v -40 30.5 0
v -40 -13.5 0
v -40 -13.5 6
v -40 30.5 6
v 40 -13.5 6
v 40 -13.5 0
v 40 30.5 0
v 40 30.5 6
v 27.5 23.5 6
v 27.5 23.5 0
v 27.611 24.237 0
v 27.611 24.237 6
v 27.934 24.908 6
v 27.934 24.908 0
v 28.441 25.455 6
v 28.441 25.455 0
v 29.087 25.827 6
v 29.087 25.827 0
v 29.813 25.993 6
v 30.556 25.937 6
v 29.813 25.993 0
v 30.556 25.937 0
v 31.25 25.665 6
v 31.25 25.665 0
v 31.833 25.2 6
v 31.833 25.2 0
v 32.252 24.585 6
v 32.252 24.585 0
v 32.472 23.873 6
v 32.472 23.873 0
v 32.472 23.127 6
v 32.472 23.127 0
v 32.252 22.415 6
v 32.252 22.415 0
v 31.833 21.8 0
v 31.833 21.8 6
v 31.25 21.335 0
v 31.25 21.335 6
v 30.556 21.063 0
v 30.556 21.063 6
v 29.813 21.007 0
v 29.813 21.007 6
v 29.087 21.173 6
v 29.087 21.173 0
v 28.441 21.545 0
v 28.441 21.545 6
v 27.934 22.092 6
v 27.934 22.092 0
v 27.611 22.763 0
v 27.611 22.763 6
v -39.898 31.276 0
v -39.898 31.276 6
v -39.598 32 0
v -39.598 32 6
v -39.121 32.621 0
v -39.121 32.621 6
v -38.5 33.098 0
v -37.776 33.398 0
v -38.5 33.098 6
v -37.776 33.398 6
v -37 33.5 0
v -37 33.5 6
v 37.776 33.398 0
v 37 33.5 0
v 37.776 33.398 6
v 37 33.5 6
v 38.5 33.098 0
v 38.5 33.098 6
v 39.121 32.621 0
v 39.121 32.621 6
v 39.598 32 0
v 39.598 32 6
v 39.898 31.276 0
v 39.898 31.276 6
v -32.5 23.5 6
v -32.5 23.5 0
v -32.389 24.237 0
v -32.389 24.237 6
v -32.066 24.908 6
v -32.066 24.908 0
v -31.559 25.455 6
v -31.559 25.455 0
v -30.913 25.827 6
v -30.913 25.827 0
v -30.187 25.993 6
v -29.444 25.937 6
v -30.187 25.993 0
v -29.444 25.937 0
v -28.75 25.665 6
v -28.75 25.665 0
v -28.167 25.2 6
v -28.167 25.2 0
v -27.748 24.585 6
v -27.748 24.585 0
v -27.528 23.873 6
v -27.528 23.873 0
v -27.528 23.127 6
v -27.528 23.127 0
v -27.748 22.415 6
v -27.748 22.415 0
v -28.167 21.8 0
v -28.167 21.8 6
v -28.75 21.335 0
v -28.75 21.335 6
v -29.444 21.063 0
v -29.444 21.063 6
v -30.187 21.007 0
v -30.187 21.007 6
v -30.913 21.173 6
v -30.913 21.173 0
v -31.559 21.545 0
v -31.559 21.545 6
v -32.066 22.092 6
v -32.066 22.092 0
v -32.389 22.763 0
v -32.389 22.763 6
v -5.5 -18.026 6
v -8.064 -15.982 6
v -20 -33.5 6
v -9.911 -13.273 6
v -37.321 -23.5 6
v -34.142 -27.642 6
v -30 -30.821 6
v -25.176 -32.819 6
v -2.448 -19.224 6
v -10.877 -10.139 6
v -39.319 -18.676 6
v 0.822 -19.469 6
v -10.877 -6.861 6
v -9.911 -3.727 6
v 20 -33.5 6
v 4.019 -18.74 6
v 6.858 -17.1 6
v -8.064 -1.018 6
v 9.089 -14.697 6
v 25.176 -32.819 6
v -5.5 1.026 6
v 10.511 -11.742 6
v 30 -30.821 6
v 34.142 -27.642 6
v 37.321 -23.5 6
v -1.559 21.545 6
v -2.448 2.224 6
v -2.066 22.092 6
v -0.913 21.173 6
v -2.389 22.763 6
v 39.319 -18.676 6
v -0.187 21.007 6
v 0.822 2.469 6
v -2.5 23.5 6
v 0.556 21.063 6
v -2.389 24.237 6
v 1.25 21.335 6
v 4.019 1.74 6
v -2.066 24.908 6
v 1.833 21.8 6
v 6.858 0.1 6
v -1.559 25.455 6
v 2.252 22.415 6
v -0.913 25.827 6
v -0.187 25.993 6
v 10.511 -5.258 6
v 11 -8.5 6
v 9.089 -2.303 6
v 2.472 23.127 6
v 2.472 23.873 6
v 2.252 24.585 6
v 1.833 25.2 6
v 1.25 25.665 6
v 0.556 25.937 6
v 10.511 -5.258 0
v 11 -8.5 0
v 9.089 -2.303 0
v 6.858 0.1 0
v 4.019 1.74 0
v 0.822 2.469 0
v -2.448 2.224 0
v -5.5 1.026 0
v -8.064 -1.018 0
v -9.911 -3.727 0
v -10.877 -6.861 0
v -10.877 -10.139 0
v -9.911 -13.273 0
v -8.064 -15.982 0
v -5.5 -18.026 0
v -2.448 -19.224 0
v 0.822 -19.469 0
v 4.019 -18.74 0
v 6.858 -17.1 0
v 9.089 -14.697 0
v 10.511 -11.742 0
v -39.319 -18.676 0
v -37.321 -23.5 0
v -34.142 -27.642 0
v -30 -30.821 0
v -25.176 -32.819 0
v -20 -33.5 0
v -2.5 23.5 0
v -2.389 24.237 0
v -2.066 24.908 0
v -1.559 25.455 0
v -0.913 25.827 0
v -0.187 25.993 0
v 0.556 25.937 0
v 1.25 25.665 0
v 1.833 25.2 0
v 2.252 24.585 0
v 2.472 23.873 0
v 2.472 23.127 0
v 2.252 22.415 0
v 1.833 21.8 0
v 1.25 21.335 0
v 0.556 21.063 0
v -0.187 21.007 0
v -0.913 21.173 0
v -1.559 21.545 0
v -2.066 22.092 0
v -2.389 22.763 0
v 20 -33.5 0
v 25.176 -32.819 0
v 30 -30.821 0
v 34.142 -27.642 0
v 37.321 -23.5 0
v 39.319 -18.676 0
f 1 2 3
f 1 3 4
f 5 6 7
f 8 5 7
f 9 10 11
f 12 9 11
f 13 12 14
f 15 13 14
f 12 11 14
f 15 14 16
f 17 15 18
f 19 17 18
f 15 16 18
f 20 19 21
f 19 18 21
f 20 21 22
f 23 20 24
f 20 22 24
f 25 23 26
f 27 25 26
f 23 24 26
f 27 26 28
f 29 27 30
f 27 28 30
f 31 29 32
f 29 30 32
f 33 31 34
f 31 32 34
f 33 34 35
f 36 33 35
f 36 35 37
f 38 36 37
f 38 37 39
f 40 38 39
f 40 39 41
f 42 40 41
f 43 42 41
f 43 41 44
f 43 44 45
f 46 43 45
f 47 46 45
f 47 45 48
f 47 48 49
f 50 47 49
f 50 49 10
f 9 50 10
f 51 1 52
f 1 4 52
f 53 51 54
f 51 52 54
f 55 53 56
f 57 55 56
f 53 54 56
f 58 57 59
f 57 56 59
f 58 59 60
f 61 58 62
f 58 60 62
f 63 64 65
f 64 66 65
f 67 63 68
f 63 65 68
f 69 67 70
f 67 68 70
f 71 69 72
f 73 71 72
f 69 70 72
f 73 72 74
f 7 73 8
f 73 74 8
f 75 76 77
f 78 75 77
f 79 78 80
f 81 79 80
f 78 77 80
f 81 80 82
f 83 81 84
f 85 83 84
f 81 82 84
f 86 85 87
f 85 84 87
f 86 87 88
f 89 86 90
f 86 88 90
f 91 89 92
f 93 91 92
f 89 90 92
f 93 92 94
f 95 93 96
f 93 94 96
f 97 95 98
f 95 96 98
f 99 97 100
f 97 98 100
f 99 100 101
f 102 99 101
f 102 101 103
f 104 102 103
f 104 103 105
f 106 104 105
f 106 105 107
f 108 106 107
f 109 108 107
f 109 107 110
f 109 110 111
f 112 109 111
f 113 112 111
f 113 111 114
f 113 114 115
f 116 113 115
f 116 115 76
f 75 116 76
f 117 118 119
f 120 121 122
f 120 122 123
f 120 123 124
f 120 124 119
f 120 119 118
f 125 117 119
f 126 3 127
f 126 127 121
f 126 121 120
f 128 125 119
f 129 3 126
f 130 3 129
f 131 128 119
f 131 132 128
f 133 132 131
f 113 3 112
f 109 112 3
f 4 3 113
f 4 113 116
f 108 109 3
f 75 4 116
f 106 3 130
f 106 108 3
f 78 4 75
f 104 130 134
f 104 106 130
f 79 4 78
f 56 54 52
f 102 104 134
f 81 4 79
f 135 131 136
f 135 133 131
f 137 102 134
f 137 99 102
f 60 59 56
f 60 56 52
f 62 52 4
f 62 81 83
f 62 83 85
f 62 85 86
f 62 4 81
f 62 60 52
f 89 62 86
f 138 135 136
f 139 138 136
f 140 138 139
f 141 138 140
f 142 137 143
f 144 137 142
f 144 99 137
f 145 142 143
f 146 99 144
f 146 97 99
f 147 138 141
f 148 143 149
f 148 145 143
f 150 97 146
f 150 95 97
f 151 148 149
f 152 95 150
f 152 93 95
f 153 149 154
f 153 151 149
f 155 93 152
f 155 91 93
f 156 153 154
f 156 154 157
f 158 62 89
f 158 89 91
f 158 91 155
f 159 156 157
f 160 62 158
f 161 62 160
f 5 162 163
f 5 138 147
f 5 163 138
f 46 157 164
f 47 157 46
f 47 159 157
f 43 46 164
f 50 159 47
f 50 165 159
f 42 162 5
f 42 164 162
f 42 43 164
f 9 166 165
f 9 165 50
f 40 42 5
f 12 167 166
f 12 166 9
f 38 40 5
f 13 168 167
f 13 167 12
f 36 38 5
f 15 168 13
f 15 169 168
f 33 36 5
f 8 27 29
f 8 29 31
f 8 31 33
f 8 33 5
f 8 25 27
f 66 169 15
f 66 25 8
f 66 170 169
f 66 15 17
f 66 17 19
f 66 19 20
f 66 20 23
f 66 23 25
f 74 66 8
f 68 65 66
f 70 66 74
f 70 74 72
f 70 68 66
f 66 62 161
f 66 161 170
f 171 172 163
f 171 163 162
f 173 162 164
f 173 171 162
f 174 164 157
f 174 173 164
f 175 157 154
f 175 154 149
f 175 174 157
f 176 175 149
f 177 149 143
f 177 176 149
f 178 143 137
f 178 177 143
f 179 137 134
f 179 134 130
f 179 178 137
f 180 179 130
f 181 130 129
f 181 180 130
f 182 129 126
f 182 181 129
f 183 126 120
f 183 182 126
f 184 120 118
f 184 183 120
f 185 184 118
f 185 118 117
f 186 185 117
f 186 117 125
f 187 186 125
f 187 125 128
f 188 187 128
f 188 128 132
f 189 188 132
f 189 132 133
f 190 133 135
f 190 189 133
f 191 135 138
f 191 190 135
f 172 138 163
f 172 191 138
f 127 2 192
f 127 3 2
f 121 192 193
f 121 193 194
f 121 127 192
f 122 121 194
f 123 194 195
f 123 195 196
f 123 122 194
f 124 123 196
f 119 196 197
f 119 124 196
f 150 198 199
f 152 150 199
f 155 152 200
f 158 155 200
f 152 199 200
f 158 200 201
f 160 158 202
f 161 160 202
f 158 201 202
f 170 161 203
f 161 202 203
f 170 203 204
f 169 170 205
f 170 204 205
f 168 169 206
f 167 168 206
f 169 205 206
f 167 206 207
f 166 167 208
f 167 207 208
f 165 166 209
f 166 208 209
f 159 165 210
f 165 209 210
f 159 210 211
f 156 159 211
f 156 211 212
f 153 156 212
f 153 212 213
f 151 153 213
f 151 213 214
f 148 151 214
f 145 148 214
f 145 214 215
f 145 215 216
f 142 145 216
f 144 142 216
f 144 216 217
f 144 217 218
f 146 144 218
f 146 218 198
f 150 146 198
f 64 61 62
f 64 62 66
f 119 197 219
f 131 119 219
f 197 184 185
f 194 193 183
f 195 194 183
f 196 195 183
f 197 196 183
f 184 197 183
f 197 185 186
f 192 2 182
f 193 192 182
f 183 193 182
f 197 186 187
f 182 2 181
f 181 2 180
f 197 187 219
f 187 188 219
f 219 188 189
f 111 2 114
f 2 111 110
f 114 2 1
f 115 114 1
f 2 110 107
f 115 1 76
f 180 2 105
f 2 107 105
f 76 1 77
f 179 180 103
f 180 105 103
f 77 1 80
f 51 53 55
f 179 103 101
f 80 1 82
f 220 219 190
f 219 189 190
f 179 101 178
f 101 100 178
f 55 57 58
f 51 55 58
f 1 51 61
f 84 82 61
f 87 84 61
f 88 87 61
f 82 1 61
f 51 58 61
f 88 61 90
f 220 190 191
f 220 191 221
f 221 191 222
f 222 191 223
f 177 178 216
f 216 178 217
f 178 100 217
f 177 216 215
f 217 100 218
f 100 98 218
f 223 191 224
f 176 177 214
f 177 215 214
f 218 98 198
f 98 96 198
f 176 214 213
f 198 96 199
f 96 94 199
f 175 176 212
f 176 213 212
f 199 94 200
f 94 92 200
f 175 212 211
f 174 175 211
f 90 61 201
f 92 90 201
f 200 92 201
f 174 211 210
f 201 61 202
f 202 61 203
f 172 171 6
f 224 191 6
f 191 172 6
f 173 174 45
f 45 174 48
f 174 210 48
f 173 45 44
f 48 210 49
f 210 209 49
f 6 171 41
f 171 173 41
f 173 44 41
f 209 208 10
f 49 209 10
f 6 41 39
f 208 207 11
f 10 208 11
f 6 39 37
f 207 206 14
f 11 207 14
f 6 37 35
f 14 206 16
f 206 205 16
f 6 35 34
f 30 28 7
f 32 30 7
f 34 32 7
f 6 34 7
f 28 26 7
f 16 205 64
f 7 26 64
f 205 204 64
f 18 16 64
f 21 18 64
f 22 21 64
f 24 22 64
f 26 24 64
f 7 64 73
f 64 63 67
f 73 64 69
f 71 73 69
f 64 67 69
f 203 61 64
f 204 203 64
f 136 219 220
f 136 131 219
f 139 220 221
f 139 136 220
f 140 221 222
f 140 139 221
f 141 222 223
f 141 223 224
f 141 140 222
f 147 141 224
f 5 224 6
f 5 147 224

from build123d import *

# Parameters (mm, degrees)
SKETCH_1_W          = 80
SKETCH_1_H          = 67
SKETCH_1_R          = 11
EXTRUDE_1_DEPTH     = 6
SKETCH_2_R          = 2.5
CUT_EXTRUDE_1_DEPTH = 10
FILLET_1_R          = 20
FILLET_2_R          = 3


with BuildPart() as part:
    # 草图1 → 凸台-拉伸1 (new body)
    with BuildSketch(Plane.XY):
        Rectangle(SKETCH_1_W, SKETCH_1_H)
        with Locations((0, -8.5)):
            Circle(SKETCH_1_R, mode=Mode.SUBTRACT)
    extrude(amount=EXTRUDE_1_DEPTH)

    # 草图2 → 切除-拉伸1 (cut)
    with BuildSketch(Plane(origin=(0, 0, 0), x_dir=(-1, 0, 0), z_dir=(0, 0, -1))):
        with Locations((-30, 23.5)):
            Circle(SKETCH_2_R)
        with Locations((30, 23.5)):
            Circle(SKETCH_2_R)
        with Locations((0, 23.5)):
            Circle(SKETCH_2_R)
    extrude(amount=-CUT_EXTRUDE_1_DEPTH, mode=Mode.SUBTRACT)

    # 圆角1
    fillet_1_edges = [part.edges().sort_by_distance(p)[0] for p in [
        (40, -33.5, 3),
        (-40, -33.5, 3),
    ]]
    fillet(fillet_1_edges, radius=FILLET_1_R)

    # 圆角2
    fillet_2_edges = [part.edges().sort_by_distance(p)[0] for p in [
        (-40, 33.5, 3),
        (40, 33.5, 3),
    ]]
    fillet(fillet_2_edges, radius=FILLET_2_R)


solid = part.part
